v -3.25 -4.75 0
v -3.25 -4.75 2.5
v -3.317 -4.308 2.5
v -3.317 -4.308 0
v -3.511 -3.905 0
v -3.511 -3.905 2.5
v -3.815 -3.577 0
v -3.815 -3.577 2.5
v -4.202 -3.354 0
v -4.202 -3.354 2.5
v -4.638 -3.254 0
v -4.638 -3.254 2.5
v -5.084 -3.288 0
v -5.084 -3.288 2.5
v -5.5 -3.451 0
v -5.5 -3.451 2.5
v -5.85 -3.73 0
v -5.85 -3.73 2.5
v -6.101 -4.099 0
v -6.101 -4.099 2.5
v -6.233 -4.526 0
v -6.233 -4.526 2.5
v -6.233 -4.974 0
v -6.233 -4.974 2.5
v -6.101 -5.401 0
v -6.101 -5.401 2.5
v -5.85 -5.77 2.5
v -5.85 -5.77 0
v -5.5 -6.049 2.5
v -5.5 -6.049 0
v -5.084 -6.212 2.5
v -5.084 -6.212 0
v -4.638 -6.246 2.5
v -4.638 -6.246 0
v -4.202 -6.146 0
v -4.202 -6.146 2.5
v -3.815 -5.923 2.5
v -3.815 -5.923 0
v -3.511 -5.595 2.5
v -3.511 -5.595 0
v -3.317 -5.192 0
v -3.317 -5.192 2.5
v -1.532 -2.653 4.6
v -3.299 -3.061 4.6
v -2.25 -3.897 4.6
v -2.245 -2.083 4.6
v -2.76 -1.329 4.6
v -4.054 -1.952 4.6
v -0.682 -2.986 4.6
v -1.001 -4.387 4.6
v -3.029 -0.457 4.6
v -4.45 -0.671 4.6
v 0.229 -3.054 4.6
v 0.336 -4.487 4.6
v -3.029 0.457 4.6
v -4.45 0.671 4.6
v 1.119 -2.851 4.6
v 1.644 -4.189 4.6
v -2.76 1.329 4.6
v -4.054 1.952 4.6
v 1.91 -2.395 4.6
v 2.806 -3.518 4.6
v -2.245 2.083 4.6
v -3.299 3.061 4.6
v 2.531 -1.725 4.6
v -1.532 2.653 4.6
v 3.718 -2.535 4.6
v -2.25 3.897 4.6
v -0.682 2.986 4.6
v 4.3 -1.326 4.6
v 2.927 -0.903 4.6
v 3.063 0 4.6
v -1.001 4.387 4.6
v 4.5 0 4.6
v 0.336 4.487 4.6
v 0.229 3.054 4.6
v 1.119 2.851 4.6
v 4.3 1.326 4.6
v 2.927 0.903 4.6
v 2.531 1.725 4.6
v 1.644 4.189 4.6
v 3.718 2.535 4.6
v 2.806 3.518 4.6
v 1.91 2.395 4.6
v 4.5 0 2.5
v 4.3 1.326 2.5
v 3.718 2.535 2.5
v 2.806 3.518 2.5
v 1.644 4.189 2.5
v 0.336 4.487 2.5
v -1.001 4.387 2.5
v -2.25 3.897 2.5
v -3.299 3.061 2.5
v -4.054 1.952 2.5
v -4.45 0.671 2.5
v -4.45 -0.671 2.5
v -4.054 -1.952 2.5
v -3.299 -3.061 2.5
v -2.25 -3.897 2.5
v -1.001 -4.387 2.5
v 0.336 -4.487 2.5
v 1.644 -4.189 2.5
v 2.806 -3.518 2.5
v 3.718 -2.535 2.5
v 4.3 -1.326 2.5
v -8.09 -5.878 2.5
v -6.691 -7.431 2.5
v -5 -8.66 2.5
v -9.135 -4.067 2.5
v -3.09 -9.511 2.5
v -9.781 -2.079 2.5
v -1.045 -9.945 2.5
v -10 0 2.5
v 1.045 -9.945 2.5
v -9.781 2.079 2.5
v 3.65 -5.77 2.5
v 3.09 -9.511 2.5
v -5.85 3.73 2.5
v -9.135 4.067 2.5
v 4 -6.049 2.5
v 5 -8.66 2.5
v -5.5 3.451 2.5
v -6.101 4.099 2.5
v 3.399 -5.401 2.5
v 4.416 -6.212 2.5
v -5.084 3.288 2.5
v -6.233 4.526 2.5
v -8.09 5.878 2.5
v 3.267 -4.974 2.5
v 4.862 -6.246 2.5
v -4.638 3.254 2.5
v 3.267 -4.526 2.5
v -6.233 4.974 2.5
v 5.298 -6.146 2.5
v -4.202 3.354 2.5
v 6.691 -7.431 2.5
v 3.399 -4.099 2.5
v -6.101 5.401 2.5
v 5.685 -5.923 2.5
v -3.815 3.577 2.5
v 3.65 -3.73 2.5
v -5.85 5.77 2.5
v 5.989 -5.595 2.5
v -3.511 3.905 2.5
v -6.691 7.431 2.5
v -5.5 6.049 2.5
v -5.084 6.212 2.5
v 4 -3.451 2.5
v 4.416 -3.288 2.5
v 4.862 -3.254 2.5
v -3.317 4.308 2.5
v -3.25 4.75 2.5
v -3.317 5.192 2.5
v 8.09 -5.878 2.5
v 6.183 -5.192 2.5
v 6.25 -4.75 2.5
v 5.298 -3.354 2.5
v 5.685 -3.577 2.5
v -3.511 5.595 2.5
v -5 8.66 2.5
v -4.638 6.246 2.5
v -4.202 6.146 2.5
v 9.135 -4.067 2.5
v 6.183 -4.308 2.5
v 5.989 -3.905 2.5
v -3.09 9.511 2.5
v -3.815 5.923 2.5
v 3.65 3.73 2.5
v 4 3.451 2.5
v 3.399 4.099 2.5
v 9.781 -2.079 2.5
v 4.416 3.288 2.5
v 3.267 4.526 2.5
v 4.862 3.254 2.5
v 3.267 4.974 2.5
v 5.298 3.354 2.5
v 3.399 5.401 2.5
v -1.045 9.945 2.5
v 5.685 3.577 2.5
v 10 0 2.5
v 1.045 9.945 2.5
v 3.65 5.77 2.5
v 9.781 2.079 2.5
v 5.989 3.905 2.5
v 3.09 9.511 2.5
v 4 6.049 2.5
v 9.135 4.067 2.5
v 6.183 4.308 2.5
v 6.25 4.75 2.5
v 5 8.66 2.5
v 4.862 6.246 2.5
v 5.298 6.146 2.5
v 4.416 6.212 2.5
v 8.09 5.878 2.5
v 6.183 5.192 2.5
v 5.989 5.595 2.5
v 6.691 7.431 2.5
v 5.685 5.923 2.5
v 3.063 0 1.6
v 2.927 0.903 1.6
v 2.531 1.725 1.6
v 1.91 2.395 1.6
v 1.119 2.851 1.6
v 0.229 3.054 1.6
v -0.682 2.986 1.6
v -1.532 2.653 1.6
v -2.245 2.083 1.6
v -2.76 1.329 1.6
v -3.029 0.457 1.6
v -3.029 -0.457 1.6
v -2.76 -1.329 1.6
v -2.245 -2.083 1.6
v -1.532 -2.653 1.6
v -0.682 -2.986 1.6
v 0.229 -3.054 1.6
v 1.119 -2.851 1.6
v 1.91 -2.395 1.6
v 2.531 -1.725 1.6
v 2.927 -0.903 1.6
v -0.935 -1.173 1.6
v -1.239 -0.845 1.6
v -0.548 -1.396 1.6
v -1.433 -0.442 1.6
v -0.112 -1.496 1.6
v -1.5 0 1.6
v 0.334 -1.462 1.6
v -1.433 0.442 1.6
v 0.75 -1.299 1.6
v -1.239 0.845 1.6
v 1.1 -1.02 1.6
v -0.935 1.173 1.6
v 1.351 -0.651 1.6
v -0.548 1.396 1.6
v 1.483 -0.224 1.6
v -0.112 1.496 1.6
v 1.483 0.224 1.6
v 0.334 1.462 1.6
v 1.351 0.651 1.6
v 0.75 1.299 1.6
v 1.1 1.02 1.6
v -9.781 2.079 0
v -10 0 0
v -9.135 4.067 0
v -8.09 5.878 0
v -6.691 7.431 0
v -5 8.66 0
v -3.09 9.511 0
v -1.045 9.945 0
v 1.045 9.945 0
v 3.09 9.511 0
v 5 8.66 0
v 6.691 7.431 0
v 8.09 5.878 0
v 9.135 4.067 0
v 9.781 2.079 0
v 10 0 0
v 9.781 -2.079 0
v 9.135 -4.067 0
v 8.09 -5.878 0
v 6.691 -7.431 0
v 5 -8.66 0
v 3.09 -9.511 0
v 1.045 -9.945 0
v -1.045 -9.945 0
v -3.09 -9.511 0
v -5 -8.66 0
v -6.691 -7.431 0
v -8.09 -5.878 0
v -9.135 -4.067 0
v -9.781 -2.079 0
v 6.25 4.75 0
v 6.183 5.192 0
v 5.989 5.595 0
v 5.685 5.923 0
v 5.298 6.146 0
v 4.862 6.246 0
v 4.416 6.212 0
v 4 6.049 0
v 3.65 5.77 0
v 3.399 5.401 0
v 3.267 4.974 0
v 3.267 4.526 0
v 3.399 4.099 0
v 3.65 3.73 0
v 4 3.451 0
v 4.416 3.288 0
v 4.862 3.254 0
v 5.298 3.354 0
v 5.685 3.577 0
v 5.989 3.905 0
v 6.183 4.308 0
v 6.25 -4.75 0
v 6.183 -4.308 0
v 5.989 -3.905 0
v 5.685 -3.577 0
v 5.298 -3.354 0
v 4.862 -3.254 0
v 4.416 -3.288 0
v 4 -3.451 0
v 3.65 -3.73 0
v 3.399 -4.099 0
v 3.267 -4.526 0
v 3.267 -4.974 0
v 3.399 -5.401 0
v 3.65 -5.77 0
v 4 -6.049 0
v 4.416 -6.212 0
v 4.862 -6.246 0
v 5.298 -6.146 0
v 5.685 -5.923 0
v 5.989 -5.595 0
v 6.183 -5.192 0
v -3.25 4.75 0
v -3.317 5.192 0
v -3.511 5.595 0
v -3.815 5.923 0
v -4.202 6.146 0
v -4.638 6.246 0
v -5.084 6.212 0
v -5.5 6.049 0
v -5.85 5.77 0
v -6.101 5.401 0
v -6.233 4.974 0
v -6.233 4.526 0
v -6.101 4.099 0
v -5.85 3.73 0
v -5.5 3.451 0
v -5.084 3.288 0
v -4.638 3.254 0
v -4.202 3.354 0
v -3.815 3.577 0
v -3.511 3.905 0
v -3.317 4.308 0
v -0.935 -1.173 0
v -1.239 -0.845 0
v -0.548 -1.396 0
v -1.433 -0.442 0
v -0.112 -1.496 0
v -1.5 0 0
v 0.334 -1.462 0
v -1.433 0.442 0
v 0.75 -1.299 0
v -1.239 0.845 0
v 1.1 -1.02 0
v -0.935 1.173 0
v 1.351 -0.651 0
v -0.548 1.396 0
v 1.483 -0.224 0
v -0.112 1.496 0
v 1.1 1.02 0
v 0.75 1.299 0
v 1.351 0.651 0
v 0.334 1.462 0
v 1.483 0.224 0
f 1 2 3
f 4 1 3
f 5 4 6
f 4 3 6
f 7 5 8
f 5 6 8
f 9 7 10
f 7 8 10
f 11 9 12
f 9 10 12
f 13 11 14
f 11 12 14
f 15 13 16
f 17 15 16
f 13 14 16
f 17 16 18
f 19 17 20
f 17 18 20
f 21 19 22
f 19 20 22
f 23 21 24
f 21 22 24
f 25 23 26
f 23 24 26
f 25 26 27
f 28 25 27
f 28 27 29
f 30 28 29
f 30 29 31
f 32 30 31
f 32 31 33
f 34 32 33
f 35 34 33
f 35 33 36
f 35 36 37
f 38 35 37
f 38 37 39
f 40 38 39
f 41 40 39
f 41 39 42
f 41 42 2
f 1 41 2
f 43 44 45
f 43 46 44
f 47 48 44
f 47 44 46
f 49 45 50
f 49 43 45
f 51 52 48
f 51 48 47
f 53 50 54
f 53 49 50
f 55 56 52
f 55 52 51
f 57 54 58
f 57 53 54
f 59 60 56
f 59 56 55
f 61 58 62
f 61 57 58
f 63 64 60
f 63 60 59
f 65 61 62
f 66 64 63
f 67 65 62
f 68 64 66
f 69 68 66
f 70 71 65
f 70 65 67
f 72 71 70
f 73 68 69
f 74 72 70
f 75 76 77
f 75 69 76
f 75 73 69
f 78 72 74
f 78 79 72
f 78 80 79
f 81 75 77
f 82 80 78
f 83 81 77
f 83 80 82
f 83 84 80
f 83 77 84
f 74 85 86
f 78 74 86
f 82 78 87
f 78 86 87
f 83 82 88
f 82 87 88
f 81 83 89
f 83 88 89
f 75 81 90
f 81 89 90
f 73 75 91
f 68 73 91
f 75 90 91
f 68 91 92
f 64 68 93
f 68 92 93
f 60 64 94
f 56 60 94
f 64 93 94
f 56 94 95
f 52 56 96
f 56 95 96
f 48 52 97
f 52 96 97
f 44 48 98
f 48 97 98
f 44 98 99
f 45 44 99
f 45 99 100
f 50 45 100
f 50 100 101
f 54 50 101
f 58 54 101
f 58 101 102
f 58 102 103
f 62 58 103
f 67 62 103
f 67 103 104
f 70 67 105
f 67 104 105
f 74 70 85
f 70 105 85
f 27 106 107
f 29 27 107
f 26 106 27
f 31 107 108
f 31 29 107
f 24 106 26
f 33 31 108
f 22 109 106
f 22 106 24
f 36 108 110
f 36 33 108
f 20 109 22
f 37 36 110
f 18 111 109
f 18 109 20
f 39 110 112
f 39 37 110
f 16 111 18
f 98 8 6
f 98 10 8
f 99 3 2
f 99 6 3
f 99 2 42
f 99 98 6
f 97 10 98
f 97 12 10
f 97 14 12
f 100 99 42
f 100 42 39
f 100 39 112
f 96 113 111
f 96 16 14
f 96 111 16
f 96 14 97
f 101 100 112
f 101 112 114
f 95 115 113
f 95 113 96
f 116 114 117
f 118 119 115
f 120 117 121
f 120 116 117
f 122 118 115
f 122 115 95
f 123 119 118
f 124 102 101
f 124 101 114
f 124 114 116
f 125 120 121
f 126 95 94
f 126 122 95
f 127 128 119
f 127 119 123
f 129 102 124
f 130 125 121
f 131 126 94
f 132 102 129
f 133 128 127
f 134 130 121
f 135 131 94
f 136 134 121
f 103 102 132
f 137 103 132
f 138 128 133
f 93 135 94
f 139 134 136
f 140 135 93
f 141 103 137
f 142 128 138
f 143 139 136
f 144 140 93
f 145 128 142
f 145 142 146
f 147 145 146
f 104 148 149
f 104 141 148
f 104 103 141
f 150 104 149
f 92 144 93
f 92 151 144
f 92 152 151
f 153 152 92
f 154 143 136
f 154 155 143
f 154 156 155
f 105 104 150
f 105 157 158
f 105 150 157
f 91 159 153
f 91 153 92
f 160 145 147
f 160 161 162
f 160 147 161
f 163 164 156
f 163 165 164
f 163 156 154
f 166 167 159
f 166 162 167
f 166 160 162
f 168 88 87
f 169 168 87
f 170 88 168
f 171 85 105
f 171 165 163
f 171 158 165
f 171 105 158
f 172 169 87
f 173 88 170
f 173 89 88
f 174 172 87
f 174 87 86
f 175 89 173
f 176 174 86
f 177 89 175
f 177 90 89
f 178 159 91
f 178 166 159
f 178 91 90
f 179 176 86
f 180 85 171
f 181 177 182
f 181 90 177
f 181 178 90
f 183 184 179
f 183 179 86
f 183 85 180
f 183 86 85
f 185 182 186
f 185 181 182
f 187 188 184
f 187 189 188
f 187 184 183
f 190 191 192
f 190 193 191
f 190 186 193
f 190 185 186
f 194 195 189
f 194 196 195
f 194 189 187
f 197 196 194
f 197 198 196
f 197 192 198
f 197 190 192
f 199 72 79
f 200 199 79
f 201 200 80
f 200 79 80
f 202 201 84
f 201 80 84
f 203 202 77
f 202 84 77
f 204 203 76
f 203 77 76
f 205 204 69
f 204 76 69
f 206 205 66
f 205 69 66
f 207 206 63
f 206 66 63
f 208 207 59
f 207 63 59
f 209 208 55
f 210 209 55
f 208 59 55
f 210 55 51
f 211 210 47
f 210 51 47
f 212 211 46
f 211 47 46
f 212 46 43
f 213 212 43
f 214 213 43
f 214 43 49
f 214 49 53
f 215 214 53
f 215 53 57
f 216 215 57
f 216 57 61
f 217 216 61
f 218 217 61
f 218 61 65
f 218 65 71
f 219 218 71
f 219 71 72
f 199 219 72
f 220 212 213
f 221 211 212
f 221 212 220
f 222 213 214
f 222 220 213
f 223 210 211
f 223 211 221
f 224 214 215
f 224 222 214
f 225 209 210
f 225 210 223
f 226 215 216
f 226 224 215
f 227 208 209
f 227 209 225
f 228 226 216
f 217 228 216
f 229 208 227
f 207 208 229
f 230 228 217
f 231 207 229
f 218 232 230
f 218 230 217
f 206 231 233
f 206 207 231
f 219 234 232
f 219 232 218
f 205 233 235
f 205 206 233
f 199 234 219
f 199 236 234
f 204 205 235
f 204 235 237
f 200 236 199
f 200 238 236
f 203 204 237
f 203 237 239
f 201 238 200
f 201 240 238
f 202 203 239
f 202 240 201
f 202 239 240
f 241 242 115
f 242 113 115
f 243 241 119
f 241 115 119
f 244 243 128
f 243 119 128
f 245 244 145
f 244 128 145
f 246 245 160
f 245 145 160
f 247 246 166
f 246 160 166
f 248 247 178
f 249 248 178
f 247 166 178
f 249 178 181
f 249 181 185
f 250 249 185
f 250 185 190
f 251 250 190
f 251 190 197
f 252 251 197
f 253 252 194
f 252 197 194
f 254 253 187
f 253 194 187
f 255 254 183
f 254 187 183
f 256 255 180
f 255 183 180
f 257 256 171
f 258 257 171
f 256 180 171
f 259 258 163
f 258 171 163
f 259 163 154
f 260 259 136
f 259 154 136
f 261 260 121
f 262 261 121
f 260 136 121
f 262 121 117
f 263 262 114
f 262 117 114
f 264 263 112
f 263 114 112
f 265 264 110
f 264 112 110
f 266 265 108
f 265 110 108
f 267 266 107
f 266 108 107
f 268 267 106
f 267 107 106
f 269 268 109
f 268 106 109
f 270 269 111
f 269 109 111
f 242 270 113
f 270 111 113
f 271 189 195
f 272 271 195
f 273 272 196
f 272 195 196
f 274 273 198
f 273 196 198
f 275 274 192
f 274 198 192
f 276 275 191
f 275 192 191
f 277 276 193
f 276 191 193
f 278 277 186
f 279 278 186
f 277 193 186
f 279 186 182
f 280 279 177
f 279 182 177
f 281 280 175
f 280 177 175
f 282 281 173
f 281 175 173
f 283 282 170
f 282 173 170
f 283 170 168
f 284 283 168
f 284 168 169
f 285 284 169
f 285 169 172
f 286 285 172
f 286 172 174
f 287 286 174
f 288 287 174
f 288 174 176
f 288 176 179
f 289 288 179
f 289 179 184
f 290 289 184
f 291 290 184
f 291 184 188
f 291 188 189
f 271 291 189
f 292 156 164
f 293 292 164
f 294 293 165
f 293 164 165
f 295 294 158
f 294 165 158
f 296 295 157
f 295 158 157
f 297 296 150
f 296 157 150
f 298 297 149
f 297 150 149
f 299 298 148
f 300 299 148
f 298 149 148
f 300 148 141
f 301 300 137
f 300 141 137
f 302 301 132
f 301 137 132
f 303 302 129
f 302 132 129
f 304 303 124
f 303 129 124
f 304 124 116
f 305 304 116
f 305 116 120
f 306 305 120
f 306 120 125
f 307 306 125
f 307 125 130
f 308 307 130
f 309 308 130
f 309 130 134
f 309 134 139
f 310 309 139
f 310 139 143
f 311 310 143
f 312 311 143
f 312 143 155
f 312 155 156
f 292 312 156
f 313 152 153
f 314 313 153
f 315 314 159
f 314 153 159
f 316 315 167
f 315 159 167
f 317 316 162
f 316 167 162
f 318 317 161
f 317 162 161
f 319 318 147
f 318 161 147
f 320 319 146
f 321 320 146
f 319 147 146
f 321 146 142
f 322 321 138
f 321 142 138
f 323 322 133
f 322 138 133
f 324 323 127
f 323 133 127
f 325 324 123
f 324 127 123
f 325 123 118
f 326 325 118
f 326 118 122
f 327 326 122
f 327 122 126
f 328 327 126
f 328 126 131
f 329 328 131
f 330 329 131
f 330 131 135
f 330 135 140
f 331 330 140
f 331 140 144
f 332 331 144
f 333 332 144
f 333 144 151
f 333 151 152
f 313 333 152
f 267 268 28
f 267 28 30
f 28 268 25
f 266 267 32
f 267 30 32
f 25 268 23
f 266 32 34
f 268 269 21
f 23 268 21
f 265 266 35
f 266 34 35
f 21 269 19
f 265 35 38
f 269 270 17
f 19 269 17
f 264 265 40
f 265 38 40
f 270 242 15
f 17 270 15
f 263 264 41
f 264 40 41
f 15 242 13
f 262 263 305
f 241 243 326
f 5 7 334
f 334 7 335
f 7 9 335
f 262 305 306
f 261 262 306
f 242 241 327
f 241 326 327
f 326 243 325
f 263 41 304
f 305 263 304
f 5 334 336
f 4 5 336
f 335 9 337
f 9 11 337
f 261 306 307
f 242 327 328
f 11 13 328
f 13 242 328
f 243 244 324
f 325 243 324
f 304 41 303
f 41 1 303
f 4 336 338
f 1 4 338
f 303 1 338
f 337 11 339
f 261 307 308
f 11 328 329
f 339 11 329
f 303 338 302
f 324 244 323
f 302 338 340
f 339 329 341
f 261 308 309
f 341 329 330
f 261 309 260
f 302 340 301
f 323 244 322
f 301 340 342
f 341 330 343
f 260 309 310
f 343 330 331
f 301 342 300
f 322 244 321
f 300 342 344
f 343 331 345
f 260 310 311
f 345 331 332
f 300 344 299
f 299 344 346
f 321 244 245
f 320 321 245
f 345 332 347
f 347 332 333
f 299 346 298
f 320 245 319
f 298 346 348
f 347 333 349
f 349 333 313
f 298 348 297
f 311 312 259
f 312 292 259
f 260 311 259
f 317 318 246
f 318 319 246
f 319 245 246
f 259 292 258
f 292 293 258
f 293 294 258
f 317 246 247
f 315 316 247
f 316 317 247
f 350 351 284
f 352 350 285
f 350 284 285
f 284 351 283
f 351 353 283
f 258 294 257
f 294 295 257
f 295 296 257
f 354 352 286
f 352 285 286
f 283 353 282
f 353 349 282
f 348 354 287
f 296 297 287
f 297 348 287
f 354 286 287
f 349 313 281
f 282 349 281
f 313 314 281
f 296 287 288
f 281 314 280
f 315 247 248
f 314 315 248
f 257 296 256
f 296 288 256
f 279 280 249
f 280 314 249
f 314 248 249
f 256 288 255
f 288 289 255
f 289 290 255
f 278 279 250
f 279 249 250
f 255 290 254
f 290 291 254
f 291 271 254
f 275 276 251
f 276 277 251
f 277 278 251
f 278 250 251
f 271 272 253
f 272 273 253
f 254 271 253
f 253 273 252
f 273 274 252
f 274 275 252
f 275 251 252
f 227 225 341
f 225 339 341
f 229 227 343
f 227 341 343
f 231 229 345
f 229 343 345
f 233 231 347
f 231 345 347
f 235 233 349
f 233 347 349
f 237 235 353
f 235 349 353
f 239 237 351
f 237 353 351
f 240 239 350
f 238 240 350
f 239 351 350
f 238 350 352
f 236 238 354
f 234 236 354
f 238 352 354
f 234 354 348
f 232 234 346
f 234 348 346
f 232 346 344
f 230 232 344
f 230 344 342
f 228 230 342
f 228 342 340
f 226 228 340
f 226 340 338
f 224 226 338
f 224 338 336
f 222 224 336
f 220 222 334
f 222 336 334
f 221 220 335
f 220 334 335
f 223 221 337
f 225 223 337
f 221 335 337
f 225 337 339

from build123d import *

# Parameters (mm, degrees)
SKETCH1_W                                          = 10
SKETCH1_H                                          = 2.5
SKETCH2_R                                          = 4.5
BOSS_EXTRUDE1_DEPTH                                = 2.1
F_3_0_3_DIAMETER_HOLE1_D                           = 3
F_3_0_3_DIAMETER_HOLE1_DEPTH                       = 4.6
CBORE_FOR_M2_5_HEX_HEAD_MACHINE_SCREW1_D           = 3
CBORE_FOR_M2_5_HEX_HEAD_MACHINE_SCREW1_CBORE_D     = 6.126092487
CBORE_FOR_M2_5_HEX_HEAD_MACHINE_SCREW1_CBORE_DEPTH = 3


with BuildPart() as part:
    # Sketch1 → Revolve1 (revolve)
    with BuildSketch(Plane.XZ, mode=Mode.PRIVATE) as revolve1_sk:
        with Locations((5, 1.25)):
            Rectangle(SKETCH1_W, SKETCH1_H)
    revolve(revolve1_sk.sketch.rotate(Axis((0, 0, 2.5), (0, 0, -1)), 180), axis=Axis((0, 0, 2.5), (0, 0, -1)))

    # Sketch2 → Boss-Extrude1 (add)
    with BuildSketch(Plane.XY.offset(2.5)):
        Circle(SKETCH2_R)
    extrude(amount=BOSS_EXTRUDE1_DEPTH)

    # Ø3.0 (3) Diameter Hole1
    with Locations(Plane(origin=(0, 0, 0), x_dir=(-1, 0, 0), z_dir=(0, 0, -1))):
        with Locations((-4.75, -4.75), (4.75, -4.75), (4.75, 4.75), (-4.75, 4.75)):
            Hole(F_3_0_3_DIAMETER_HOLE1_D / 2, depth=F_3_0_3_DIAMETER_HOLE1_DEPTH)

    # CBORE for M2.5 Hex Head Machine Screw1 (through all)
    with Locations(Plane.XY.offset(4.6)):
        with Locations((0, 0)):
            CounterBoreHole(CBORE_FOR_M2_5_HEX_HEAD_MACHINE_SCREW1_D / 2, CBORE_FOR_M2_5_HEX_HEAD_MACHINE_SCREW1_CBORE_D / 2, CBORE_FOR_M2_5_HEX_HEAD_MACHINE_SCREW1_CBORE_DEPTH)


solid = part.part
